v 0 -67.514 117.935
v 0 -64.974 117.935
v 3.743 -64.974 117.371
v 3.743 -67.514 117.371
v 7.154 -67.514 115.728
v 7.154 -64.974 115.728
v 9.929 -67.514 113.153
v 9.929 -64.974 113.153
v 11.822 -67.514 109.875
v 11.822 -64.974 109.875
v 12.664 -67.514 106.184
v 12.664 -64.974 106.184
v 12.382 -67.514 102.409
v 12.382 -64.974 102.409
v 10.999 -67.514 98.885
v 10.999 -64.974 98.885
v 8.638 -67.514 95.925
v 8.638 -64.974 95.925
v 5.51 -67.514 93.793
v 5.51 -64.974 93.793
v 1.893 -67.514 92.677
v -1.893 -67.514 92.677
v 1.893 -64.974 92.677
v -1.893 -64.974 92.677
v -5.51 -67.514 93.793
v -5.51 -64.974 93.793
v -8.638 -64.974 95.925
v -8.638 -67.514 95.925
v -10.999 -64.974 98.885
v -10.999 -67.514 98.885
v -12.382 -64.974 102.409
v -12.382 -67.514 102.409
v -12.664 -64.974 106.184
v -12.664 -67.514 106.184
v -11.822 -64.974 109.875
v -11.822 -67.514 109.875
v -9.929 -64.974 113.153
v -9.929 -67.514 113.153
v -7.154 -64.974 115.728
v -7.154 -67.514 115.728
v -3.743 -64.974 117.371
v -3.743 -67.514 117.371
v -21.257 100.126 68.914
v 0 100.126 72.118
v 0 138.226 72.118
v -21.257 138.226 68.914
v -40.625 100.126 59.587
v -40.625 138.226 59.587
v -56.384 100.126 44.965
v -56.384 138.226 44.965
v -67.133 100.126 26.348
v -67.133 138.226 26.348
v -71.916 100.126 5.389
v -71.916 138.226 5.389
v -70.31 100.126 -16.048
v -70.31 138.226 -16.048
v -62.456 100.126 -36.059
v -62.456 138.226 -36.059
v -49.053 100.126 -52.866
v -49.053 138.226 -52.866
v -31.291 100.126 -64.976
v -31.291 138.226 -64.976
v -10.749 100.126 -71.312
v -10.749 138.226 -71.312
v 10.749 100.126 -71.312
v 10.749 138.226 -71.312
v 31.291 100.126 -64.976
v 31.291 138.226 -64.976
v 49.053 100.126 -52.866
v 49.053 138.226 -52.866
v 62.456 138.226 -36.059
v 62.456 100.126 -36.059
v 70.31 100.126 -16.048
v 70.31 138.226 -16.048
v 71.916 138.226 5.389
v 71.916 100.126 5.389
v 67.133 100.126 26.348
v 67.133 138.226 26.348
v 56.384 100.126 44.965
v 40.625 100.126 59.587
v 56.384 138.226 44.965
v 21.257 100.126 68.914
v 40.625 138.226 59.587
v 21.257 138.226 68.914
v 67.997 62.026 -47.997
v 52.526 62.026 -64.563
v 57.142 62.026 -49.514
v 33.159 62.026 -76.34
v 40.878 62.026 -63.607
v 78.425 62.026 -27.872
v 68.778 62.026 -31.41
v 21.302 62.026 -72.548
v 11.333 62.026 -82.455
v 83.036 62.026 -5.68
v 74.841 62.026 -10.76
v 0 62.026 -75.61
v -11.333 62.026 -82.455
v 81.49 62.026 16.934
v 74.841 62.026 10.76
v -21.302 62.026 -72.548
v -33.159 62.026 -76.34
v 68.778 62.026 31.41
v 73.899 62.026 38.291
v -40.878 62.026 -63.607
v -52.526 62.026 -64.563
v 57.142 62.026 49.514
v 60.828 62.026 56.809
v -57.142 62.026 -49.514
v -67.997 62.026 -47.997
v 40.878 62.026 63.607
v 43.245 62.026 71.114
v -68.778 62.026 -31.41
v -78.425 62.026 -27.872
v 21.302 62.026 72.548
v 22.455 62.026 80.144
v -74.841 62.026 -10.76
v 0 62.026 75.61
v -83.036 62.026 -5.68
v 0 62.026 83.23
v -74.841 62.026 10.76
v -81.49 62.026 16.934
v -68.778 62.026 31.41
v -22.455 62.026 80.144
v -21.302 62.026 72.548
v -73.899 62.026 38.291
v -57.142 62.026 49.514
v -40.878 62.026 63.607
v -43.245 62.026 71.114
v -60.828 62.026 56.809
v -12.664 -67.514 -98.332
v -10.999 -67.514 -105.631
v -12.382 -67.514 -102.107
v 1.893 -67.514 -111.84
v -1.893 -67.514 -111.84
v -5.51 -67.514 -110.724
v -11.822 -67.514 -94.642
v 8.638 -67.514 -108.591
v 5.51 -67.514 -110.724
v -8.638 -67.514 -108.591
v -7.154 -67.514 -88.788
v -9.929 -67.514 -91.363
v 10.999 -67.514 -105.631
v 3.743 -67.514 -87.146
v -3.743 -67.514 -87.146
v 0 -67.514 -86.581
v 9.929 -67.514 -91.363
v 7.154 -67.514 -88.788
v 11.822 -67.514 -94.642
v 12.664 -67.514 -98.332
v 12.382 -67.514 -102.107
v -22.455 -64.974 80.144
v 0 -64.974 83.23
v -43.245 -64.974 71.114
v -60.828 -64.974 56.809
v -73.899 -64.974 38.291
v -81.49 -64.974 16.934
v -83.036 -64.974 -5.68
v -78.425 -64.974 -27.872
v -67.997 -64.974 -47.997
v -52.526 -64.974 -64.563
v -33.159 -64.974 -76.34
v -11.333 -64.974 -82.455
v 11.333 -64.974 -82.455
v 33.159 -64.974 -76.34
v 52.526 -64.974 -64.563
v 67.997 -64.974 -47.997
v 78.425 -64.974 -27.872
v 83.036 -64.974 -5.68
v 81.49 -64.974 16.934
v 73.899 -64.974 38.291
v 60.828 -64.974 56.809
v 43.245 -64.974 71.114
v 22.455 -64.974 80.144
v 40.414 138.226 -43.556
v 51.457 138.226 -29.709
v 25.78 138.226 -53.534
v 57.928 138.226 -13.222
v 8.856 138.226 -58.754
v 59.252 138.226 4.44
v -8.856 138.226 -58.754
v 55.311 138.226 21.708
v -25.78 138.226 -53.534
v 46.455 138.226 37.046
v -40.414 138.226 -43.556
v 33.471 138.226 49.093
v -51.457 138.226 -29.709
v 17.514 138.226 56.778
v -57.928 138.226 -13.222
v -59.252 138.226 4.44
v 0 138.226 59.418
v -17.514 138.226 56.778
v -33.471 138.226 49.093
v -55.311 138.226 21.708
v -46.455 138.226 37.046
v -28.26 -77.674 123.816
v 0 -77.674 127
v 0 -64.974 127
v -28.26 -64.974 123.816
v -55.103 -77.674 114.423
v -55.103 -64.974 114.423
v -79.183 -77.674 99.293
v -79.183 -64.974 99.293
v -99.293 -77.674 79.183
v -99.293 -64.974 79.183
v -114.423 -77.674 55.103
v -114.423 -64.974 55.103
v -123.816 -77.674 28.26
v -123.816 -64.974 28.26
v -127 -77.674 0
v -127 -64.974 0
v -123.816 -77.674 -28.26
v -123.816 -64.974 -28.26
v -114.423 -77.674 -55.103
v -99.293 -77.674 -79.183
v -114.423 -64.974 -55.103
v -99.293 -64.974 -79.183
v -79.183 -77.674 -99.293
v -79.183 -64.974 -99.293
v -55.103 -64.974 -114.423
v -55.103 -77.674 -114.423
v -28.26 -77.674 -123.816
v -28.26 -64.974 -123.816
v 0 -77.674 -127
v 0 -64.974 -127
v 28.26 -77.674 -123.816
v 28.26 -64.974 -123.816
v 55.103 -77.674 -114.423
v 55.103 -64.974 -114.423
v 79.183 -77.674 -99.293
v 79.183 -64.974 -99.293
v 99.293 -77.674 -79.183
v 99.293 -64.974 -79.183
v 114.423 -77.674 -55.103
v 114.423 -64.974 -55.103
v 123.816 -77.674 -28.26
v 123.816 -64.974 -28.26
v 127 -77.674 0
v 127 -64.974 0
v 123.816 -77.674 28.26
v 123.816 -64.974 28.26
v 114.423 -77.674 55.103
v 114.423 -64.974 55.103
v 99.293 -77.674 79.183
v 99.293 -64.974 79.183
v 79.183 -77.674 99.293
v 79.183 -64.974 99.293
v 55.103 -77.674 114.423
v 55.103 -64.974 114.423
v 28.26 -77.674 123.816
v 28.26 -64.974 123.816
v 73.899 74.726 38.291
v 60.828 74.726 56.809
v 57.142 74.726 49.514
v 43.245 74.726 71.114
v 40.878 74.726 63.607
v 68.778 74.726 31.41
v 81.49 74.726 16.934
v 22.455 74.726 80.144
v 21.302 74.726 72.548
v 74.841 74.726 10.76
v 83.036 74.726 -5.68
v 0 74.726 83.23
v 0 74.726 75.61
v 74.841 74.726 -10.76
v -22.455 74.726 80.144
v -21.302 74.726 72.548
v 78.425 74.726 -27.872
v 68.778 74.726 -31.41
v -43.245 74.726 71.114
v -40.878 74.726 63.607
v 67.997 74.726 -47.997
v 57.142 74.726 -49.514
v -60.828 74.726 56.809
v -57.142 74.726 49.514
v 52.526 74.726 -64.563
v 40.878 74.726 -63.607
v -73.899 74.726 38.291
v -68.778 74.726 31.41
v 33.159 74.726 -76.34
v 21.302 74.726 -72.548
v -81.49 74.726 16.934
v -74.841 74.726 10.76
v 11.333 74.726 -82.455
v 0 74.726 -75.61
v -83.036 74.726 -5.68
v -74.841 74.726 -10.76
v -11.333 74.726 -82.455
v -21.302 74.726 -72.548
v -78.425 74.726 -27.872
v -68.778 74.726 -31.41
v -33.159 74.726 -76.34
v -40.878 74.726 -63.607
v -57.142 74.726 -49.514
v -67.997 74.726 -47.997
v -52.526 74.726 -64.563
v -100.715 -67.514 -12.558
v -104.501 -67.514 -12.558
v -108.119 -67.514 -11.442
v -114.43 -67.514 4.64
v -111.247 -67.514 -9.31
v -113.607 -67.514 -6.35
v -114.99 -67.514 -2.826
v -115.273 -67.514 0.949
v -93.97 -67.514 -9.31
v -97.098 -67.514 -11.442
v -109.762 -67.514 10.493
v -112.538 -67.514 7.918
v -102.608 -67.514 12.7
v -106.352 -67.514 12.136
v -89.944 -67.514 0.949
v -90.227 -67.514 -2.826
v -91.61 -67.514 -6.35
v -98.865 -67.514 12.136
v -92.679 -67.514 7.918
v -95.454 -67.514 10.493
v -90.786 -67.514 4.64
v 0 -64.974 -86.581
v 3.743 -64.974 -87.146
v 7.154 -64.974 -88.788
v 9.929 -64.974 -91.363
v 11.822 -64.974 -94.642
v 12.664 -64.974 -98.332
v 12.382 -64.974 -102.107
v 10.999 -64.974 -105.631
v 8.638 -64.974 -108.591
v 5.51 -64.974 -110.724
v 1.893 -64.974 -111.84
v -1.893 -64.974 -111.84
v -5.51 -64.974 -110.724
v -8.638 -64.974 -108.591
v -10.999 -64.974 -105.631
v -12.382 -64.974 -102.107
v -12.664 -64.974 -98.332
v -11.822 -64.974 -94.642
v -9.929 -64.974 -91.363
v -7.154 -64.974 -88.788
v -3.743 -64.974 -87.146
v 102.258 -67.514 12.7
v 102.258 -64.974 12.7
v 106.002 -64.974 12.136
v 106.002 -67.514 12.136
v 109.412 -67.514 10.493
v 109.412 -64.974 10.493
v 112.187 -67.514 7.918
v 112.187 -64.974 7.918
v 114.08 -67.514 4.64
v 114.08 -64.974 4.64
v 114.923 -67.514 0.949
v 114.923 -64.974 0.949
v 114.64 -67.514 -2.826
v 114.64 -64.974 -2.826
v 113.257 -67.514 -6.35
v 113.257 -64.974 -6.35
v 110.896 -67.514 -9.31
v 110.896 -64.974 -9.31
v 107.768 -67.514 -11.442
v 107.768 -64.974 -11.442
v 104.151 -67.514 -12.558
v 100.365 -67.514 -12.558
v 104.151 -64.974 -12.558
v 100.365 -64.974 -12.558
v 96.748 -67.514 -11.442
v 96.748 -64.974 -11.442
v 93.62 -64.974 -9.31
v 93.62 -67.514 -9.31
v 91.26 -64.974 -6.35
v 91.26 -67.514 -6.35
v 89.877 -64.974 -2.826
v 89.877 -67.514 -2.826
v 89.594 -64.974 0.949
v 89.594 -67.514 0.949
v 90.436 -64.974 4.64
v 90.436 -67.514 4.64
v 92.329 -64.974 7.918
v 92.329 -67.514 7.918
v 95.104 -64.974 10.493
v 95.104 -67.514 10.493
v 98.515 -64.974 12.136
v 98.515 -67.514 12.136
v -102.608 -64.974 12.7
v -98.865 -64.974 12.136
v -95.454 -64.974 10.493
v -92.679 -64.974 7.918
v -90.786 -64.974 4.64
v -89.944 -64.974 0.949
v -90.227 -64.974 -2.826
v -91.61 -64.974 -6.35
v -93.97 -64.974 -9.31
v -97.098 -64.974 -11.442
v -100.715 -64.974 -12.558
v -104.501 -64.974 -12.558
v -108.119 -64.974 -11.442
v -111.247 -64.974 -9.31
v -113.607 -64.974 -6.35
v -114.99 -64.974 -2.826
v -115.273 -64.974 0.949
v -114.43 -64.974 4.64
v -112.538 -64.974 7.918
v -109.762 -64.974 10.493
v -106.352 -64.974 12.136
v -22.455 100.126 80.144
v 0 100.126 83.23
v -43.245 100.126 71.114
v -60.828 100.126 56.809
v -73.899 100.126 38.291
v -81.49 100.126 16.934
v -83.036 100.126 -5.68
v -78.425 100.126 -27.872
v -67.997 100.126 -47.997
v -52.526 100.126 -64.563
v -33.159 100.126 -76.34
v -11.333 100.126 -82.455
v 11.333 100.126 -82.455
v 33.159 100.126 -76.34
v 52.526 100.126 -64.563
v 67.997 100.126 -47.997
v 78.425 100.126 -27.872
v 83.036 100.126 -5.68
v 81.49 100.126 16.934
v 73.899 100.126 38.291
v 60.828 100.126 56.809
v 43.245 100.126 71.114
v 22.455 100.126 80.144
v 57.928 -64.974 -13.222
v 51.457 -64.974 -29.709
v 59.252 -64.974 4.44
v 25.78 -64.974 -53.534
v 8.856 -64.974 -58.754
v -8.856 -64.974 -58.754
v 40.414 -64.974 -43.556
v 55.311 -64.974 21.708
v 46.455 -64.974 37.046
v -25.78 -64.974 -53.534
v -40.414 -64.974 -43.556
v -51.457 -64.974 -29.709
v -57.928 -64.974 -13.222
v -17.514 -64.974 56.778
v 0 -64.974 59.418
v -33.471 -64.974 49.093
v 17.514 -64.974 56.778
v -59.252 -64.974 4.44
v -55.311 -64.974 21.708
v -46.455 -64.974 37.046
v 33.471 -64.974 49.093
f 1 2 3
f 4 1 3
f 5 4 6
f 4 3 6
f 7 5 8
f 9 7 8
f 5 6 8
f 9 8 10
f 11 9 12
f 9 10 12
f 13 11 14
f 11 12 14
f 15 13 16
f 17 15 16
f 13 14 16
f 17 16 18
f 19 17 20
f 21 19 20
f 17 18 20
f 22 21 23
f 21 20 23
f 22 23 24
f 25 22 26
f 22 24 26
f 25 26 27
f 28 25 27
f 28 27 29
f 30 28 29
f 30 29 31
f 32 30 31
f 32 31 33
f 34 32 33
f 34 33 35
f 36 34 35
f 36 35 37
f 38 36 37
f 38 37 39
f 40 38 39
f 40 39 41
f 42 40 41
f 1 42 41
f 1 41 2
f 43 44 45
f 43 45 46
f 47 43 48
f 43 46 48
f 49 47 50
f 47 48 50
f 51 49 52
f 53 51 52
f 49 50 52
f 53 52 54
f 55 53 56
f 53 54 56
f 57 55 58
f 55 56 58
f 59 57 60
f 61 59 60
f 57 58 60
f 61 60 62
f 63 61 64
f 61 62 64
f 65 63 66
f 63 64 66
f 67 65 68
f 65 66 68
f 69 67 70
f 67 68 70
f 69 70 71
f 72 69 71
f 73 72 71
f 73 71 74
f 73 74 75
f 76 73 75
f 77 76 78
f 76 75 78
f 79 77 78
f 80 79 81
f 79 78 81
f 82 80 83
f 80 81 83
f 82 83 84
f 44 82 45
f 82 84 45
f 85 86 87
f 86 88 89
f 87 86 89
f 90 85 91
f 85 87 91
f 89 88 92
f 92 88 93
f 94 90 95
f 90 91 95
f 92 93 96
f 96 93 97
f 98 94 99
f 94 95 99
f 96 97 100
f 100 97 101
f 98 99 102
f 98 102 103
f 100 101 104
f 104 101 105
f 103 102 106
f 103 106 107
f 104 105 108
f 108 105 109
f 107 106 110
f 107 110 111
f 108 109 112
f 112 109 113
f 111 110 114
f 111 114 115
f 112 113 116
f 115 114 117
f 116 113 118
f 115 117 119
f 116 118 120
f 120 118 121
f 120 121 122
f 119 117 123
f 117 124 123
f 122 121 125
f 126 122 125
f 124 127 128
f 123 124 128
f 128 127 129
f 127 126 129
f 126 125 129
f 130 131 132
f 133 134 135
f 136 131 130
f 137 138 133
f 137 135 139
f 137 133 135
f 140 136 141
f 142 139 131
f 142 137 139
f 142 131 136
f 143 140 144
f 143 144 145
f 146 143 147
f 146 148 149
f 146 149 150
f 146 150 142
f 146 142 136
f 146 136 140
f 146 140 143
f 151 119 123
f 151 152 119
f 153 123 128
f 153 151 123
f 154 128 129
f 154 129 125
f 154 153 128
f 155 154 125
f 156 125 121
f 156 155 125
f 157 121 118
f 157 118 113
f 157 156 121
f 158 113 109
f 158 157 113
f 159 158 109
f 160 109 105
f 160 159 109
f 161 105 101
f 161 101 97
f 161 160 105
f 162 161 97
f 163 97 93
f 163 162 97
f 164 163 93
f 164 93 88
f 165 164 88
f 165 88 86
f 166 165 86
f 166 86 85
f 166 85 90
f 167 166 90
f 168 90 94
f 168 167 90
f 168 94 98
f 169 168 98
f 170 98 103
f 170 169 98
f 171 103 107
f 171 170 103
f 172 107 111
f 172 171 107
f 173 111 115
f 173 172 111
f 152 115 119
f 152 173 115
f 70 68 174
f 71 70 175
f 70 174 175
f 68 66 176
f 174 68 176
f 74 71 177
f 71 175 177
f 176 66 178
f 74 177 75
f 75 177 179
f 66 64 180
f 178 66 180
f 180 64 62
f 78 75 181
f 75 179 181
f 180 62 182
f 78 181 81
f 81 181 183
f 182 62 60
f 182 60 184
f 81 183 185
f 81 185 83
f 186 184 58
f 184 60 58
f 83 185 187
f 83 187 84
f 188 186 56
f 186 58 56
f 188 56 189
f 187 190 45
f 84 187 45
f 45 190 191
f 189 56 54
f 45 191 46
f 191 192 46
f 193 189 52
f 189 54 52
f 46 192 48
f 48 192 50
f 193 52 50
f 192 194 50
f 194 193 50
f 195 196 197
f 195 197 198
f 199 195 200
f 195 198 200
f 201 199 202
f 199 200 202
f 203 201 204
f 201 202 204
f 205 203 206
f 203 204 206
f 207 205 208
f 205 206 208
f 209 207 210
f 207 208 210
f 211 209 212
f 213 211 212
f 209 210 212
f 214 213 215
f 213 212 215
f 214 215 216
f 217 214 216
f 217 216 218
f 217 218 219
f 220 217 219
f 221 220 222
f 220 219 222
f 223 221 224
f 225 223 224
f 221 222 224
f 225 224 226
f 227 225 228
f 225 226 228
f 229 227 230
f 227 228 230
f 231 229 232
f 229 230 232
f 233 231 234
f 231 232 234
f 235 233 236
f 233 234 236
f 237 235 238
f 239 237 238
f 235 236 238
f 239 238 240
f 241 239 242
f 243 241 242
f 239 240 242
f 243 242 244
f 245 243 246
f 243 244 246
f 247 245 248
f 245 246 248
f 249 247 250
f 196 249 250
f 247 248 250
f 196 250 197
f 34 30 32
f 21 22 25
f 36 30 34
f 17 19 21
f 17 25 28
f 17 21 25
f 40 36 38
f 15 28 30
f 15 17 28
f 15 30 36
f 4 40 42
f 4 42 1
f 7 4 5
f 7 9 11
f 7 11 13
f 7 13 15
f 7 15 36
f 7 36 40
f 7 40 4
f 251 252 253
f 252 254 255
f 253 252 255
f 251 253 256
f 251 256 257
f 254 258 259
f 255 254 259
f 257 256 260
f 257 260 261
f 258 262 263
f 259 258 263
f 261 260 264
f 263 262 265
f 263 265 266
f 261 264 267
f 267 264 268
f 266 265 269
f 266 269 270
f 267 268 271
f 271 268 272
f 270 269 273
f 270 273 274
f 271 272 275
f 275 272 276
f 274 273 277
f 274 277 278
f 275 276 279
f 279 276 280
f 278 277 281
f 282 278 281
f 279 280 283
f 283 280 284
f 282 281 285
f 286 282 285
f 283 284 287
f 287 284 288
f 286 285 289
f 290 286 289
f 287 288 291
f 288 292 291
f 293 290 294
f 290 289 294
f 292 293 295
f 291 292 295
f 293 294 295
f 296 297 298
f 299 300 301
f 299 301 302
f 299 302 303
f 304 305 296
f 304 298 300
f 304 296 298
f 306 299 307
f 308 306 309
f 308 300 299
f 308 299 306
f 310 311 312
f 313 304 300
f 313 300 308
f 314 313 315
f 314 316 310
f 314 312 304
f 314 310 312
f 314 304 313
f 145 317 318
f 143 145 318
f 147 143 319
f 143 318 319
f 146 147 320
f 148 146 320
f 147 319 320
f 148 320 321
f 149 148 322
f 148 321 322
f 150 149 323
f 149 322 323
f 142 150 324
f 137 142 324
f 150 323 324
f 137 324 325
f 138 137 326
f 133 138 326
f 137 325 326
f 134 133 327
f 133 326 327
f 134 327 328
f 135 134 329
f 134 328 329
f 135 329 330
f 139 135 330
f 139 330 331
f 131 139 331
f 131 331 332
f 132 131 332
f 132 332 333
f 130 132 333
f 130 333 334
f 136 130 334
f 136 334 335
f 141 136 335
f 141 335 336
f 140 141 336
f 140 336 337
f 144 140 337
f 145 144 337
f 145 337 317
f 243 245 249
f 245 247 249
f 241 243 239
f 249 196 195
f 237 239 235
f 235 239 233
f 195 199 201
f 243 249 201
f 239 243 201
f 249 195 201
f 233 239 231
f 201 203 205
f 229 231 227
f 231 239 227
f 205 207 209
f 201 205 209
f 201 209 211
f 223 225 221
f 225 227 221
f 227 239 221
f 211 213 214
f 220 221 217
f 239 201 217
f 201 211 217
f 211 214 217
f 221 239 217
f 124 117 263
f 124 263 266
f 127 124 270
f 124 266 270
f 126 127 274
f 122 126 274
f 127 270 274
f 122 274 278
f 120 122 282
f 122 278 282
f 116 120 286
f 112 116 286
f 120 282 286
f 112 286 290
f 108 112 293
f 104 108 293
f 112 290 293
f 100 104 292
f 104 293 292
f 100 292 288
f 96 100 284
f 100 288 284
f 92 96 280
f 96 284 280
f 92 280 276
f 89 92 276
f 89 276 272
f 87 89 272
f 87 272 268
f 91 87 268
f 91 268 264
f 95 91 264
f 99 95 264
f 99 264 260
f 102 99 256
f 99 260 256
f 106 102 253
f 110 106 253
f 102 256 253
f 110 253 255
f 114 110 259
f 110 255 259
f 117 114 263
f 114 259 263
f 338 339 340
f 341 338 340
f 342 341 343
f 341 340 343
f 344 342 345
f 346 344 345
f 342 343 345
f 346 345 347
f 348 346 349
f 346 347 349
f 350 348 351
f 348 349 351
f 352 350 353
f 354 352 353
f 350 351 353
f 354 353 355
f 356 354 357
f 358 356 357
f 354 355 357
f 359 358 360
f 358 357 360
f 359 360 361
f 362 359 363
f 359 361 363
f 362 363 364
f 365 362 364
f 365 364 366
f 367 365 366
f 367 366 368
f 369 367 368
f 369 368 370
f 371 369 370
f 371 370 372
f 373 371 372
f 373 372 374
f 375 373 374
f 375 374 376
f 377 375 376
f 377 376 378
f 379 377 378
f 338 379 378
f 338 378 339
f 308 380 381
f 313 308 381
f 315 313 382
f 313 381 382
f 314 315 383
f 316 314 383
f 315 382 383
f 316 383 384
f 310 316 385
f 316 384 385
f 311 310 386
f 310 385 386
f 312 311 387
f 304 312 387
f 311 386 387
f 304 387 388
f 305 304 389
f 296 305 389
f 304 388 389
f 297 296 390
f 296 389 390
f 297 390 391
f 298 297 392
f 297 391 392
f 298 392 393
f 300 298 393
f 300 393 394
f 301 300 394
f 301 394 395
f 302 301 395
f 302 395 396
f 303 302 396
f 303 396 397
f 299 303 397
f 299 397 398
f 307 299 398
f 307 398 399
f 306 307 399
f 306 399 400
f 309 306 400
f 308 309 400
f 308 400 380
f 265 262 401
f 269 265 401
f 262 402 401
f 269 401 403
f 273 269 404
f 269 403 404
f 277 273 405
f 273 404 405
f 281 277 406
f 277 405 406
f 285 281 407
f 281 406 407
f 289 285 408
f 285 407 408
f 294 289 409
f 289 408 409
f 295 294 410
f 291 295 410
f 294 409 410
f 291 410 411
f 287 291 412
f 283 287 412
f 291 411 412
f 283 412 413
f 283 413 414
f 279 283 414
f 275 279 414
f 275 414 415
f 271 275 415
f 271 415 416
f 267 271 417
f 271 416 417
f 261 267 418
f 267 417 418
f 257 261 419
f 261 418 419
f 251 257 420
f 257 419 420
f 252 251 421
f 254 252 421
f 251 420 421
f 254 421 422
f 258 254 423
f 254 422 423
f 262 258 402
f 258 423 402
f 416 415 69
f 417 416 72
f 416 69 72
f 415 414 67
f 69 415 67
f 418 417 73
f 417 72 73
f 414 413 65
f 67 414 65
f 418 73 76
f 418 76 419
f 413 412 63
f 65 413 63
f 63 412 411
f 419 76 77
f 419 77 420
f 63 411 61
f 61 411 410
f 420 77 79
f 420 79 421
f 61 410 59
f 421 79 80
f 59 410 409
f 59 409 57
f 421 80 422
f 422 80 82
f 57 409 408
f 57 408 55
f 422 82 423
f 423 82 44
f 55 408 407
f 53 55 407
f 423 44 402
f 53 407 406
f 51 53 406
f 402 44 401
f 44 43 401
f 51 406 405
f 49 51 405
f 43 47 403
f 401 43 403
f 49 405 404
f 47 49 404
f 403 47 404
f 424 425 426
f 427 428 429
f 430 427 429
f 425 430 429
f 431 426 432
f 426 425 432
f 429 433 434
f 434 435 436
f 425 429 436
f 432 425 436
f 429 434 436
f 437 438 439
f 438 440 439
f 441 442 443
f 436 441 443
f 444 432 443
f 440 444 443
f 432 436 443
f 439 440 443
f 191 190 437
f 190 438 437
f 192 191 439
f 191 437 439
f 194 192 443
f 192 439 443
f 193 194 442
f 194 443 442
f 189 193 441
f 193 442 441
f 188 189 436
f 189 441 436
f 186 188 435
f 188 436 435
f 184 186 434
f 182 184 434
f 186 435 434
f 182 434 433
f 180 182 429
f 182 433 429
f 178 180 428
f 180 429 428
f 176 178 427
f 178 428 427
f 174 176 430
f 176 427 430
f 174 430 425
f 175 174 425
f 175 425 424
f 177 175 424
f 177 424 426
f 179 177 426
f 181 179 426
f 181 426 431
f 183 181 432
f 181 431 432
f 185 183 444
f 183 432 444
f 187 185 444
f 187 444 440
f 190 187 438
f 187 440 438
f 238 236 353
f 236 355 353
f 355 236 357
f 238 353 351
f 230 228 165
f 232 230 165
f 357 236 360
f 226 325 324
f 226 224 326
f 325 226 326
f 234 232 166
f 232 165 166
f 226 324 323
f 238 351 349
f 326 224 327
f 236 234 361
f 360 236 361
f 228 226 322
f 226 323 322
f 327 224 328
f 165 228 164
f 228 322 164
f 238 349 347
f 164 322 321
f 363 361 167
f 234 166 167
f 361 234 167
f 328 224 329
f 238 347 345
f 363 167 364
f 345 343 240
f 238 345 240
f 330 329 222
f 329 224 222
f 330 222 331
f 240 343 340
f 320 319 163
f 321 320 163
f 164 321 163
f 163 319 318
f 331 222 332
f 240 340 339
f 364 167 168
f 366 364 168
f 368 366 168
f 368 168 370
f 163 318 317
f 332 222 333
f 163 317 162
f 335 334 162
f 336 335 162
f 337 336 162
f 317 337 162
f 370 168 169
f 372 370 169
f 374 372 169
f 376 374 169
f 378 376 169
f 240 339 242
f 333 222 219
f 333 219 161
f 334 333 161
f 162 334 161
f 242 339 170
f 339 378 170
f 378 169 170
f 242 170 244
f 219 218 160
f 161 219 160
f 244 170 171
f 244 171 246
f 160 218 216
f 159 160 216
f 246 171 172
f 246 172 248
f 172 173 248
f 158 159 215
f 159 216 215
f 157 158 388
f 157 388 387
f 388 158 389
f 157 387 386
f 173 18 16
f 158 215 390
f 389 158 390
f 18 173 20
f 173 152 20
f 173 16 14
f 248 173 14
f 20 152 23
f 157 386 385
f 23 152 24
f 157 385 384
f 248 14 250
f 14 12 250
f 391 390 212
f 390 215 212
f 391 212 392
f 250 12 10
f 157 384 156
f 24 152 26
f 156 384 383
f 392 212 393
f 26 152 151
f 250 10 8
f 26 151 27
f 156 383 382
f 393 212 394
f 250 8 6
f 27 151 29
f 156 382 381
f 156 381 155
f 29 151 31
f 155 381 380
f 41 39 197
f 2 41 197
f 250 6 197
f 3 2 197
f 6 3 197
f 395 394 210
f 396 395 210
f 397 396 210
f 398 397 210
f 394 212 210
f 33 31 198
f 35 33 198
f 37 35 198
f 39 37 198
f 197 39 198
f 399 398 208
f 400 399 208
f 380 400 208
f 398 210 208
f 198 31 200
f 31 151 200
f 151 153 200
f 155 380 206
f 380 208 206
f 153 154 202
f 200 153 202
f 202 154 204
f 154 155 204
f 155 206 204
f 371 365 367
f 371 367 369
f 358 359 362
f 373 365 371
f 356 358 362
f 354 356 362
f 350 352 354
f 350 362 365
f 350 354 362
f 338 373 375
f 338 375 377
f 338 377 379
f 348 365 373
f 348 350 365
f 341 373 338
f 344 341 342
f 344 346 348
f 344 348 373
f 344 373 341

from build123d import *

# Parameters (mm, degrees)
SKETCH2_R          = 12.7
CUT_EXTRUDE1_DEPTH = 67.514107143


with BuildPart() as part:
    # Sketch1 → Revolve1 (revolve)
    with BuildSketch(Plane.XY, mode=Mode.PRIVATE) as revolve1_sk:
        Polygon((0, -77.674107143), (-127, -77.674107143), (-127, -64.974107143), (-83.230357143, -64.974107143), (-83.230357143, -14.174107143), (-83.230357143, 62.025892857), (-75.610357143, 62.025892857), (-75.610357143, 74.725892857), (-83.230357143, 74.725892857), (-83.230357143, 100.125892857), (-72.117857143, 100.125892857), (-72.117857143, 138.225892857), (-59.417857143, 138.225892857), (-59.417857143, -64.974107143), (0, -64.974107143), align=None)
    revolve(revolve1_sk.sketch.rotate(Axis((0, 71.324107143, 0), (0, -1, 0)), 270), axis=Axis((0, 71.324107143, 0), (0, -1, 0)))

    # Sketch2 → Cut-Extrude1 (cut)
    with BuildSketch(Plane(origin=(0, 0, 0), x_dir=(1, 0, 0), z_dir=(0, 1, 0))):
        with Locations(Location((-102.608331848, 0, 0), (0, 0, 270))):
            Circle(SKETCH2_R)
        with Locations(Location((0, -105.234824984, 0), (0, 0, 270))):
            Circle(SKETCH2_R)
        with Locations(Location((102.258132763, 0, 0), (0, 0, 270))):
            Circle(SKETCH2_R)
        with Locations(Location((0, 99.281440542, 0), (0, 0, 270))):
            Circle(SKETCH2_R)
    extrude(amount=-CUT_EXTRUDE1_DEPTH, mode=Mode.SUBTRACT)


solid = part.part
